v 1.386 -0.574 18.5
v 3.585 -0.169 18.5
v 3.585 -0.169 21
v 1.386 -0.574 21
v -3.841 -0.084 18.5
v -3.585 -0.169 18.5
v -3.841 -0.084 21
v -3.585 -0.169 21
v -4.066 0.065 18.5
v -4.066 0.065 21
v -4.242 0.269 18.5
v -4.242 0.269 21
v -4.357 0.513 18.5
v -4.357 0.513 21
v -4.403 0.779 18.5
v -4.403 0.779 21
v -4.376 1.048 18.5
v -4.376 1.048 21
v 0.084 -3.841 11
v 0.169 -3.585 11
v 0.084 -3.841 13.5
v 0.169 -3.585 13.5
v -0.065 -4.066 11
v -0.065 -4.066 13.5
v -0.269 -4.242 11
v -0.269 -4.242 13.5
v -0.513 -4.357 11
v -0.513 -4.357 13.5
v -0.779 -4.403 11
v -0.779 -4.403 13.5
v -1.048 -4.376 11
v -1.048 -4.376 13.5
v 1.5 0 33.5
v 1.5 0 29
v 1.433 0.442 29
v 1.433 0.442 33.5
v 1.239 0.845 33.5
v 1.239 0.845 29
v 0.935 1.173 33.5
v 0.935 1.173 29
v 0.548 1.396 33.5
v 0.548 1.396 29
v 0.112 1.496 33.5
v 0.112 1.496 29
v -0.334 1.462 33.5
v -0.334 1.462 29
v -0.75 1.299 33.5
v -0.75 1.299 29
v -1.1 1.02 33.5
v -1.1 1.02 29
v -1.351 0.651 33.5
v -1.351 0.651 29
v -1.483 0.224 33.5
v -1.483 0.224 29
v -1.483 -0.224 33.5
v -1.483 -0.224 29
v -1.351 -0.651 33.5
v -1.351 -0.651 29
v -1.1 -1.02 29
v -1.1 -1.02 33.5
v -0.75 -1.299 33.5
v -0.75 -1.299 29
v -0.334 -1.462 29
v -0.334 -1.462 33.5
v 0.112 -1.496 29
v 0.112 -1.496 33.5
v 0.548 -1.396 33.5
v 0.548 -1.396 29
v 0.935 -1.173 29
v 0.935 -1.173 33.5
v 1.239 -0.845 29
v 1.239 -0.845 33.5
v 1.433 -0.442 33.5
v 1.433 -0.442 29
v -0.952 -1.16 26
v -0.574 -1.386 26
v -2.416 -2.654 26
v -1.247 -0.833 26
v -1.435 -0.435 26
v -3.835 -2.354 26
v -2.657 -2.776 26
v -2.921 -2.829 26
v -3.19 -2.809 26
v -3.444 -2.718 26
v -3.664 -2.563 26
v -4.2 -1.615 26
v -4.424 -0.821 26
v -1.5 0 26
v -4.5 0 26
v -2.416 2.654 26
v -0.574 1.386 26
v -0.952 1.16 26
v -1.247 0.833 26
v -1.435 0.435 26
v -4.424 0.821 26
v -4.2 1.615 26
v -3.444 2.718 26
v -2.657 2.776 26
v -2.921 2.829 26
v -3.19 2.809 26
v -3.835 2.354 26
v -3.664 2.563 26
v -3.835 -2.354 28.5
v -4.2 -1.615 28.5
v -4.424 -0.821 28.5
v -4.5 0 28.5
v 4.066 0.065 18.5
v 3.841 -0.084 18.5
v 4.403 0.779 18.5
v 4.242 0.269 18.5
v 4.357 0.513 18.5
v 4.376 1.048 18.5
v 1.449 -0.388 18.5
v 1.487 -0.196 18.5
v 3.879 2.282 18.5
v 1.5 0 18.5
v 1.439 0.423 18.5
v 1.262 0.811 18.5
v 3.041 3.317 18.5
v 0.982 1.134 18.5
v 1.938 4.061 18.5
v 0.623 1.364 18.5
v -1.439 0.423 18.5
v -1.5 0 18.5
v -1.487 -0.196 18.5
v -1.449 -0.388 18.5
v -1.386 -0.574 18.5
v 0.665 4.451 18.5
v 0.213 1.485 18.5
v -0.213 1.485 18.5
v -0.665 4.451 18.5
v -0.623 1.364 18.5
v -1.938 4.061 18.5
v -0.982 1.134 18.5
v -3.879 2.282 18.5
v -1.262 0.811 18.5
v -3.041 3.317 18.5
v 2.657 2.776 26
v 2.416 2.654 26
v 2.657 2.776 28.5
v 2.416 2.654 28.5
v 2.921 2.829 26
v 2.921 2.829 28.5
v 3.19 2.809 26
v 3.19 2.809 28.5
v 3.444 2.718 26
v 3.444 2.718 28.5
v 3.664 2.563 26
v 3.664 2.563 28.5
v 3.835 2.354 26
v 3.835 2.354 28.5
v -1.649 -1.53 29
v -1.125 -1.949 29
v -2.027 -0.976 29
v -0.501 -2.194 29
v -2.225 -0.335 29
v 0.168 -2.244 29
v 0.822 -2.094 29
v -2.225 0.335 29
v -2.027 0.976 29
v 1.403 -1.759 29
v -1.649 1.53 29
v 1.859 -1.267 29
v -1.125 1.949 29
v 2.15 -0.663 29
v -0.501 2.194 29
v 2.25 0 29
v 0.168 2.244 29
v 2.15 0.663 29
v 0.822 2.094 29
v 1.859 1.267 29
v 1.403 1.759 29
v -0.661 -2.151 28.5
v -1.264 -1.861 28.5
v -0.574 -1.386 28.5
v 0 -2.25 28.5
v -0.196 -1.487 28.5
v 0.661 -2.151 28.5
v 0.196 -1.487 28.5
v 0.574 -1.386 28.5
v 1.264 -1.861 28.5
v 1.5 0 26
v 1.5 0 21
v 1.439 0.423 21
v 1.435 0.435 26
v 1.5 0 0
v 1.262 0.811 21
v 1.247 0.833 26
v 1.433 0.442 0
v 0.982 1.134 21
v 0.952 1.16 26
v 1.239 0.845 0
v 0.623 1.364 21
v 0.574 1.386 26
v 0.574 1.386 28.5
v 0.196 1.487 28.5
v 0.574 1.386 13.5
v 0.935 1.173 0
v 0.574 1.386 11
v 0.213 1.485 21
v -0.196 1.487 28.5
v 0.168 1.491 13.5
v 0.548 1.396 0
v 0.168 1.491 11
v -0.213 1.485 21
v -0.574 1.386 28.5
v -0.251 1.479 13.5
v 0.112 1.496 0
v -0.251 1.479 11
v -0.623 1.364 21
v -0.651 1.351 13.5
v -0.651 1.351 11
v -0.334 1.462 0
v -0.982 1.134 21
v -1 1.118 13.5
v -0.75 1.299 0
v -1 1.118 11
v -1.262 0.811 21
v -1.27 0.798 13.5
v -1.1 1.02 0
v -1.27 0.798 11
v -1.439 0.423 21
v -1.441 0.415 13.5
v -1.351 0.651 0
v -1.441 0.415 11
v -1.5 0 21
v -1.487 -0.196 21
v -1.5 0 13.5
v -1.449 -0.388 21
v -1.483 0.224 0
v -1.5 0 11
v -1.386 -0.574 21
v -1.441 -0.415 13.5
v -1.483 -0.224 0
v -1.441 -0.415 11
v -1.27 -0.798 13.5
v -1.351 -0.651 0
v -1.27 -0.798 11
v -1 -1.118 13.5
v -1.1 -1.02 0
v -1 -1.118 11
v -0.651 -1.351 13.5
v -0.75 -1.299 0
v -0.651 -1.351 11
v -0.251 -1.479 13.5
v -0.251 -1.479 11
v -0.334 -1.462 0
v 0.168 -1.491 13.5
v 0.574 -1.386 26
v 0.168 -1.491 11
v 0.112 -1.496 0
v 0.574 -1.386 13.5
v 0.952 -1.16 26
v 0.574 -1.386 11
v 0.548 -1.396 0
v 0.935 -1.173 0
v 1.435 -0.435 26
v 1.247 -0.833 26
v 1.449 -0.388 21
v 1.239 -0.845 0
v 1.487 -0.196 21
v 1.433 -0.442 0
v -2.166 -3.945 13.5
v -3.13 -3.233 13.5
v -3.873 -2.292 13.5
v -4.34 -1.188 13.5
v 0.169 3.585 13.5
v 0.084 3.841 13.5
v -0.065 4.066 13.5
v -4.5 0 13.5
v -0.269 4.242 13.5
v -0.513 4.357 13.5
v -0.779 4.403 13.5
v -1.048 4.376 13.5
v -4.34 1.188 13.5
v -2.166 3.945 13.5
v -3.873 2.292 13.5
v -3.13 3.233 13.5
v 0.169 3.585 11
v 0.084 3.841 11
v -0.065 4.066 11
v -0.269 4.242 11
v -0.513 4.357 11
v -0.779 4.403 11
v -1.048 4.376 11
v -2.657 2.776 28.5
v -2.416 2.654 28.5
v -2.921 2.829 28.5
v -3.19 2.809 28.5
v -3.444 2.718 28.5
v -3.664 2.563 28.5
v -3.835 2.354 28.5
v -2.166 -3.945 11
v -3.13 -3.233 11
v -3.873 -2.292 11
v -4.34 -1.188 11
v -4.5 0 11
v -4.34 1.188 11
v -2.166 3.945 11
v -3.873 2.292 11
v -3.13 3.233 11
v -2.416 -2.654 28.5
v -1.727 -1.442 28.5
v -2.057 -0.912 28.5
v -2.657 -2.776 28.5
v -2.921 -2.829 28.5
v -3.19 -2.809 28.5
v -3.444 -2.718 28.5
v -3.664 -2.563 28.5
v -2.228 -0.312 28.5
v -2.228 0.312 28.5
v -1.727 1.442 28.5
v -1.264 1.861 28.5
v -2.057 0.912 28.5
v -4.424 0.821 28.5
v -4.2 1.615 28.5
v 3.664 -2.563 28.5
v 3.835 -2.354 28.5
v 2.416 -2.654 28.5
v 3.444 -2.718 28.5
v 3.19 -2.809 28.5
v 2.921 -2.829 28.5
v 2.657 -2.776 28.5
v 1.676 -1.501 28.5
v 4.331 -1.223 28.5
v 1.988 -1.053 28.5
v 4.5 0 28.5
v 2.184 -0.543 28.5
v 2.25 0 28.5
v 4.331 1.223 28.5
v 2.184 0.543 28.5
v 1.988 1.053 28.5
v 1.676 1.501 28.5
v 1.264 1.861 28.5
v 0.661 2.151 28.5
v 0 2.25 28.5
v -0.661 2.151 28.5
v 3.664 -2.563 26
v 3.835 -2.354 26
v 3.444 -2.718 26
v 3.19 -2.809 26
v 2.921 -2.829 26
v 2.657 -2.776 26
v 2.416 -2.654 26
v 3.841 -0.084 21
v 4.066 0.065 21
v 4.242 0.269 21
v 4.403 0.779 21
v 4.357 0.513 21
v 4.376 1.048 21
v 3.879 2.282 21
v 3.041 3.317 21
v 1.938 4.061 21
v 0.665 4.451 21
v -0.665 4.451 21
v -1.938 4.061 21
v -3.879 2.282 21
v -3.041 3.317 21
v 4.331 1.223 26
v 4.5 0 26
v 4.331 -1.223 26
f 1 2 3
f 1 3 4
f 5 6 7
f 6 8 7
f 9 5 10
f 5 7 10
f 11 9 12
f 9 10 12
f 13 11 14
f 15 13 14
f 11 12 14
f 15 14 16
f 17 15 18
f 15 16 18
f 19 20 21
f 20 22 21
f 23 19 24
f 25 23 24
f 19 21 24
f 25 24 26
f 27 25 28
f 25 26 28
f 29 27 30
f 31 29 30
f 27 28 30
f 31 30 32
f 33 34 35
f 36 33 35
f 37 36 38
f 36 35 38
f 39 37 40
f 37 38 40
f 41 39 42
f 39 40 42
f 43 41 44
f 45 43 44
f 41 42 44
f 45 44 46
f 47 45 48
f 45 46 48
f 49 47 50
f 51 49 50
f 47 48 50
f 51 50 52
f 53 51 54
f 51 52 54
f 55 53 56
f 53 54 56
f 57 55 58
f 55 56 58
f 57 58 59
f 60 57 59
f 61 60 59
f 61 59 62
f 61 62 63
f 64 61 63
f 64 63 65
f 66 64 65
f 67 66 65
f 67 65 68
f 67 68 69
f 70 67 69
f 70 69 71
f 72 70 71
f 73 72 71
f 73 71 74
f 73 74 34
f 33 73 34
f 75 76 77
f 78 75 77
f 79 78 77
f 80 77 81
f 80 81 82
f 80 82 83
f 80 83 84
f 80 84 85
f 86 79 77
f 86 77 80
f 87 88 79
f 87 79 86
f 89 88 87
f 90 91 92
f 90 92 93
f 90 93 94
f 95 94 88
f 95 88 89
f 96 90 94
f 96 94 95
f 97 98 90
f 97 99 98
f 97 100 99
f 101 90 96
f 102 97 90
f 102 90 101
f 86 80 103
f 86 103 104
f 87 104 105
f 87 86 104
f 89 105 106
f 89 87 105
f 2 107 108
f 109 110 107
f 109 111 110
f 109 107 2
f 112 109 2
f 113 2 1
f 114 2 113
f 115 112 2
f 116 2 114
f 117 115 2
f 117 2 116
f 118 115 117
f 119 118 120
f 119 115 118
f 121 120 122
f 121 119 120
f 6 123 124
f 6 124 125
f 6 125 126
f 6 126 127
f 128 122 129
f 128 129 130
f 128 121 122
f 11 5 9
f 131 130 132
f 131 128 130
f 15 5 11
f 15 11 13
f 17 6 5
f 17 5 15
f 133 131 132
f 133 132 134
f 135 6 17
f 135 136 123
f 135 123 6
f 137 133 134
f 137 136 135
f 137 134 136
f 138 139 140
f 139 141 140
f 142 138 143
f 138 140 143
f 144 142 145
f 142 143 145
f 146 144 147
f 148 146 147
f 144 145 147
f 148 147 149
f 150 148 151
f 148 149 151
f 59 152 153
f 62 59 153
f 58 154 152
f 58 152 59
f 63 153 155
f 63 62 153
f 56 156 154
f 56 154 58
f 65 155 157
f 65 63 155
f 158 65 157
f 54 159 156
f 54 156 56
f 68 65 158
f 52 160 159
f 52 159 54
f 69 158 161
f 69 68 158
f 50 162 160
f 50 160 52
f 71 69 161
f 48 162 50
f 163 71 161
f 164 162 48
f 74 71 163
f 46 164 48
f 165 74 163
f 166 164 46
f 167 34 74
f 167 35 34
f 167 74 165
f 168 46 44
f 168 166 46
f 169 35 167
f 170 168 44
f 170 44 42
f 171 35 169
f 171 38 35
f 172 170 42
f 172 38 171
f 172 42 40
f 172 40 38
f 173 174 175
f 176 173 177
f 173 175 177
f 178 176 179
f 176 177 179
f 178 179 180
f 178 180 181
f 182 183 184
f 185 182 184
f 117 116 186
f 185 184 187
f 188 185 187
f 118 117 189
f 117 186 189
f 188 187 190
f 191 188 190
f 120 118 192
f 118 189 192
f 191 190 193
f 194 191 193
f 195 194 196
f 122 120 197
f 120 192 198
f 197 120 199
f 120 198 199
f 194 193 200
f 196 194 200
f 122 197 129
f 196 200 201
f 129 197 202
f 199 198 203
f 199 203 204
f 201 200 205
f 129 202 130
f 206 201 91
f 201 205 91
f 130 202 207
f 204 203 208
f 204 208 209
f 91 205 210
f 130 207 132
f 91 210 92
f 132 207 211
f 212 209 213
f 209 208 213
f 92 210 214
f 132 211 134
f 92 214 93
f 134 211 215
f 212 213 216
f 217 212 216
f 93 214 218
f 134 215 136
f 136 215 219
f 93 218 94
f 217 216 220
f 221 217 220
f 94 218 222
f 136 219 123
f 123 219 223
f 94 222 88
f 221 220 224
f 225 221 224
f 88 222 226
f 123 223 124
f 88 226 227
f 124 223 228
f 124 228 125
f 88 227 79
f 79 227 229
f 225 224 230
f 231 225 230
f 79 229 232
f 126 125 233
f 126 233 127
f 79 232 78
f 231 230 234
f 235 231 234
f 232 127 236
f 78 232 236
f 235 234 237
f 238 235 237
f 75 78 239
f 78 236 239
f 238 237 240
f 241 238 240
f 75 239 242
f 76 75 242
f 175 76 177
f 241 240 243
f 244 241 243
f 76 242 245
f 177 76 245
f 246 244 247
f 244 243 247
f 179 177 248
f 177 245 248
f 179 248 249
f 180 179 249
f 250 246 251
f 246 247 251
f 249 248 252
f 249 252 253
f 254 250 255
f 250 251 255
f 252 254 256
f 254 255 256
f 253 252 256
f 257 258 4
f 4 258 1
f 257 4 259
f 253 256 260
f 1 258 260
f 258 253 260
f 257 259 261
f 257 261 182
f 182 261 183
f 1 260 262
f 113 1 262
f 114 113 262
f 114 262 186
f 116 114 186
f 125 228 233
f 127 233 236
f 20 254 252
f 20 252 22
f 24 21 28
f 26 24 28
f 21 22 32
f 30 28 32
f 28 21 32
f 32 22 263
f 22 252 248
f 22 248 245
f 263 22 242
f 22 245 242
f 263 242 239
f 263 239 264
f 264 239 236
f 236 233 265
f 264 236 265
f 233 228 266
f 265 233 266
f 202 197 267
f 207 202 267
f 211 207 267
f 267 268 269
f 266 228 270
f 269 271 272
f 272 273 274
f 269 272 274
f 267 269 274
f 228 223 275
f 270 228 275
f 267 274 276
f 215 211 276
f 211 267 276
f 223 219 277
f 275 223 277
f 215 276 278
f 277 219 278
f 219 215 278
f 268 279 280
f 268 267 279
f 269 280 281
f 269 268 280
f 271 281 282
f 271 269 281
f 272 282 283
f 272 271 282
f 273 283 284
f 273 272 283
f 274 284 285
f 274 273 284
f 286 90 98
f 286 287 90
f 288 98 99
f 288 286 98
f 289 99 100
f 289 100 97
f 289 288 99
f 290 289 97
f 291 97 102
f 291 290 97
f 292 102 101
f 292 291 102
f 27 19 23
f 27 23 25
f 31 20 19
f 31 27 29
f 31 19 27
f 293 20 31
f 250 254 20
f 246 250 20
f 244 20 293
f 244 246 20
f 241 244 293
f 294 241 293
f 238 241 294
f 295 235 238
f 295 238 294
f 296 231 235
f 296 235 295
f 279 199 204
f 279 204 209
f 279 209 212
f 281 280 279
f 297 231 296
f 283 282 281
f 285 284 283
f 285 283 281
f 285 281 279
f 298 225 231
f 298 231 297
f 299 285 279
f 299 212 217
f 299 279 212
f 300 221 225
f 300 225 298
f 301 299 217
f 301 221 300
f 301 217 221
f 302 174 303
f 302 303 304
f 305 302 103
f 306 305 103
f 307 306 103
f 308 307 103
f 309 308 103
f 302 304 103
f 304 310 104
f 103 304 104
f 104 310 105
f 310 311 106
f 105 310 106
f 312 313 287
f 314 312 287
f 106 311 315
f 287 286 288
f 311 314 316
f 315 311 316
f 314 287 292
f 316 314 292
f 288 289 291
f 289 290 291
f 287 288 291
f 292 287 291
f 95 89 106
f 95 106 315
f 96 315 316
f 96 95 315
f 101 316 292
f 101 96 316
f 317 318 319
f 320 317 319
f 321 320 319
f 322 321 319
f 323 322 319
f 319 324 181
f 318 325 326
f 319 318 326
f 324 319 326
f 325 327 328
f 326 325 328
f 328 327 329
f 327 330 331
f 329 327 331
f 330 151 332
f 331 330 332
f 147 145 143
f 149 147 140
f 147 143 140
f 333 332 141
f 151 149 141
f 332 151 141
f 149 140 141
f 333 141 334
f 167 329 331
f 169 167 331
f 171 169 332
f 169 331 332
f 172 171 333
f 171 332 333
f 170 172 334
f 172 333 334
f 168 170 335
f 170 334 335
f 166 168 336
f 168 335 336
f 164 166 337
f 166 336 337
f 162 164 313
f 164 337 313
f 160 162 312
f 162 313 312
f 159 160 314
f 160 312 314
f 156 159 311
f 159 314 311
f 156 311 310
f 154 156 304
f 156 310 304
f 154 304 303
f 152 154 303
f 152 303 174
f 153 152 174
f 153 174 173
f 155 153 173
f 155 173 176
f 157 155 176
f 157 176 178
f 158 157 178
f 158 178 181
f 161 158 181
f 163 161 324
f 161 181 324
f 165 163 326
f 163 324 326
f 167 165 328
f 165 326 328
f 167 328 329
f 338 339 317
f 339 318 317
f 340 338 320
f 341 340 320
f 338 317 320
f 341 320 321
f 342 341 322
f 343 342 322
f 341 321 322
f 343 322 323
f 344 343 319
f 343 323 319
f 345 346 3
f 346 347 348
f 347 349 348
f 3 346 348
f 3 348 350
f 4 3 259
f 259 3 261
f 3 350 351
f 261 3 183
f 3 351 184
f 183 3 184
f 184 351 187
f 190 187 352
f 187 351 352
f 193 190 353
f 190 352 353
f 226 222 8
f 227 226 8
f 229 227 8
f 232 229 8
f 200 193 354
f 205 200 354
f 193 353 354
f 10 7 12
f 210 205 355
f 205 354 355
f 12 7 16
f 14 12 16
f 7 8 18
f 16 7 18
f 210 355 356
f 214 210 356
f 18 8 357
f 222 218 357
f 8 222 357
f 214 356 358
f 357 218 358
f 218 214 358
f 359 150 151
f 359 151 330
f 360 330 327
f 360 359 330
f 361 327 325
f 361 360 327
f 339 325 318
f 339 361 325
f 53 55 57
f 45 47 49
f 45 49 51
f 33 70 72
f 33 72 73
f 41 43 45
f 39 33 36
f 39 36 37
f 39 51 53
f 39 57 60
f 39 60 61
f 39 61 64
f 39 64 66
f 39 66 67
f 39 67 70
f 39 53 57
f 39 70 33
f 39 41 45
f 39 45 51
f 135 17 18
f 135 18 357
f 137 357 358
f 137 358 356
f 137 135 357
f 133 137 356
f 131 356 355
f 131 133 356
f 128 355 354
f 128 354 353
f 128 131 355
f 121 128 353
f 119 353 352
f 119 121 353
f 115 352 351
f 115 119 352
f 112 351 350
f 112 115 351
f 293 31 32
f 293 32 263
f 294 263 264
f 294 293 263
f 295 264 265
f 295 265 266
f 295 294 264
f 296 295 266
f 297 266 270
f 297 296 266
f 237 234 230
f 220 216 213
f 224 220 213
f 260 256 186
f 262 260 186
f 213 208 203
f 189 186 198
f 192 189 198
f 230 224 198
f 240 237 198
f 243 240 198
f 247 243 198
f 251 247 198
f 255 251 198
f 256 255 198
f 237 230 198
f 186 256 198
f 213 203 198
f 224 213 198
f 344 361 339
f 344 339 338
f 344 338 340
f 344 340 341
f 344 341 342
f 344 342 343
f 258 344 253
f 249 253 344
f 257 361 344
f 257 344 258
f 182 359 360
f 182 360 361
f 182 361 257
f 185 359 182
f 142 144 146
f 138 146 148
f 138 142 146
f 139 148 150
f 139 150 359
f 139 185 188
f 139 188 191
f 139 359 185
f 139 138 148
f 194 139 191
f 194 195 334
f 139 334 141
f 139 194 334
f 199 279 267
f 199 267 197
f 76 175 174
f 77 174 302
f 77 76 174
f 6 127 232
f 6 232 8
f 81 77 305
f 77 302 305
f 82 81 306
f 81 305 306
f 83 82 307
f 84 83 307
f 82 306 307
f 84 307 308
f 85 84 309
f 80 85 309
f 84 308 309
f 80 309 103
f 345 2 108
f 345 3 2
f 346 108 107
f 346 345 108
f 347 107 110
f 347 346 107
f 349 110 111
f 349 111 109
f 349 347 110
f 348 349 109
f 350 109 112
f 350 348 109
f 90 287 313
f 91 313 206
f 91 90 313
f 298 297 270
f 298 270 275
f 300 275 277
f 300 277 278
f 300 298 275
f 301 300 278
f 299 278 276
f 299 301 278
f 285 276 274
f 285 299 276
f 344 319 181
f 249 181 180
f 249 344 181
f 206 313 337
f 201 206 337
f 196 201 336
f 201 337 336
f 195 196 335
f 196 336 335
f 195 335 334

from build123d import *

# Parameters (mm, degrees)
SKETCH_2_R       = 1.5
SHAFT_DEPTH      = 33.5
EXCENTRIC1_DEPTH = 2.5
EXTRUDE_3_DEPTH  = 2.5
EXTRUDE_4_DEPTH  = 2.5
FILLET_1_R       = 1
SKETCH_7_R       = 2.25
EXTRUDE_5_DEPTH  = 0.5


with BuildPart() as part:
    # Эскиз2 → shaft (new body)
    with BuildSketch(Plane.XY):
        Circle(SKETCH_2_R)
    extrude(amount=SHAFT_DEPTH)

    # Эскиз3 → excentric1 (add)
    with BuildSketch(Plane(origin=(0, 0, 11), x_dir=(-1, 0, 0), z_dir=(0, 0, -1))):
        with BuildLine():
            ThreePointArc((4.5, 0), (3.181980515, 3.181980515), (0, 4.5))
            Line((0, 4.5), (-0.574025149, 1.385819299))
            ThreePointArc((-0.574025149, 1.385819299), (0.83335535, 1.247204418), (1.5, 0))
            ThreePointArc((1.5, 0), (0.83335535, -1.247204418), (-0.574025149, -1.385819299))
            Line((-0.574025149, -1.385819299), (0, -4.5))
            ThreePointArc((0, -4.5), (3.181980515, -3.181980515), (4.5, 0))
        make_face()
    extrude(amount=-EXCENTRIC1_DEPTH)

    # excentric2sketch → Бобышка-Вытянуть3 (add)
    with BuildSketch(Plane(origin=(0, 0, 18.5), x_dir=(-1, 0, 0), z_dir=(0, 0, -1))):
        with BuildLine():
            ThreePointArc((4.5, 0), (0, 4.5), (-4.5, 0))
            Line((-4.5, 0), (-1.385819299, -0.574025149))
            ThreePointArc((-1.385819299, -0.574025149), (-0.292635483, 1.471177921), (1.5, 0))
            ThreePointArc((1.5, 0), (1.471177921, -0.292635483), (1.385819299, -0.574025149))
            Line((1.385819299, -0.574025149), (4.5, 0))
        make_face()
    extrude(amount=-EXTRUDE_3_DEPTH)

    # excentric3sketch → Бобышка-Вытянуть4 (add)
    with BuildSketch(Plane(origin=(0, 0, 26), x_dir=(-1, 0, 0), z_dir=(0, 0, -1))):
        with BuildLine():
            Line((-0.574025149, 1.385819299), (-3.181980515, 3.181980515))
            ThreePointArc((-3.181980515, 3.181980515), (-4.5, 0), (-3.181980515, -3.181980515))
            Line((-3.181980515, -3.181980515), (-0.574025149, -1.385819299))
            ThreePointArc((-0.574025149, -1.385819299), (-1.5, 0), (-0.574025149, 1.385819299))
        make_face()
        with BuildLine():
            ThreePointArc((4.5, 0), (4.157457896, 1.722075446), (3.181980515, 3.181980515))
            Line((3.181980515, 3.181980515), (0.574025149, 1.385819299))
            ThreePointArc((0.574025149, 1.385819299), (1.247204418, 0.83335535), (1.5, 0))
            ThreePointArc((1.5, 0), (1.247204418, -0.83335535), (0.574025149, -1.385819299))
            Line((0.574025149, -1.385819299), (3.181980515, -3.181980515))
            ThreePointArc((3.181980515, -3.181980515), (4.157457896, -1.722075446), (4.5, 0))
        make_face()
    extrude(amount=-EXTRUDE_4_DEPTH)

    # Скругление1
    fillet_1_edges = [part.edges().sort_by_distance(p)[0] for p in [
        (4.5, 0, 19.75),
        (-4.5, 0, 19.75),
        (3.181980515, -3.181980515, 27.25),
        (3.181980515, 3.181980515, 27.25),
        (-3.181980515, 3.181980515, 27.25),
        (-3.181980515, -3.181980515, 27.25),
        (0, 4.5, 12.25),
        (0, -4.5, 12.25),
    ]]
    fillet(fillet_1_edges, radius=FILLET_1_R)

    # Эскиз7 → Бобышка-Вытянуть5 (add)
    with BuildSketch(Plane.XY.offset(28.5)):
        Circle(SKETCH_7_R)
    extrude(amount=EXTRUDE_5_DEPTH)


solid = part.part
